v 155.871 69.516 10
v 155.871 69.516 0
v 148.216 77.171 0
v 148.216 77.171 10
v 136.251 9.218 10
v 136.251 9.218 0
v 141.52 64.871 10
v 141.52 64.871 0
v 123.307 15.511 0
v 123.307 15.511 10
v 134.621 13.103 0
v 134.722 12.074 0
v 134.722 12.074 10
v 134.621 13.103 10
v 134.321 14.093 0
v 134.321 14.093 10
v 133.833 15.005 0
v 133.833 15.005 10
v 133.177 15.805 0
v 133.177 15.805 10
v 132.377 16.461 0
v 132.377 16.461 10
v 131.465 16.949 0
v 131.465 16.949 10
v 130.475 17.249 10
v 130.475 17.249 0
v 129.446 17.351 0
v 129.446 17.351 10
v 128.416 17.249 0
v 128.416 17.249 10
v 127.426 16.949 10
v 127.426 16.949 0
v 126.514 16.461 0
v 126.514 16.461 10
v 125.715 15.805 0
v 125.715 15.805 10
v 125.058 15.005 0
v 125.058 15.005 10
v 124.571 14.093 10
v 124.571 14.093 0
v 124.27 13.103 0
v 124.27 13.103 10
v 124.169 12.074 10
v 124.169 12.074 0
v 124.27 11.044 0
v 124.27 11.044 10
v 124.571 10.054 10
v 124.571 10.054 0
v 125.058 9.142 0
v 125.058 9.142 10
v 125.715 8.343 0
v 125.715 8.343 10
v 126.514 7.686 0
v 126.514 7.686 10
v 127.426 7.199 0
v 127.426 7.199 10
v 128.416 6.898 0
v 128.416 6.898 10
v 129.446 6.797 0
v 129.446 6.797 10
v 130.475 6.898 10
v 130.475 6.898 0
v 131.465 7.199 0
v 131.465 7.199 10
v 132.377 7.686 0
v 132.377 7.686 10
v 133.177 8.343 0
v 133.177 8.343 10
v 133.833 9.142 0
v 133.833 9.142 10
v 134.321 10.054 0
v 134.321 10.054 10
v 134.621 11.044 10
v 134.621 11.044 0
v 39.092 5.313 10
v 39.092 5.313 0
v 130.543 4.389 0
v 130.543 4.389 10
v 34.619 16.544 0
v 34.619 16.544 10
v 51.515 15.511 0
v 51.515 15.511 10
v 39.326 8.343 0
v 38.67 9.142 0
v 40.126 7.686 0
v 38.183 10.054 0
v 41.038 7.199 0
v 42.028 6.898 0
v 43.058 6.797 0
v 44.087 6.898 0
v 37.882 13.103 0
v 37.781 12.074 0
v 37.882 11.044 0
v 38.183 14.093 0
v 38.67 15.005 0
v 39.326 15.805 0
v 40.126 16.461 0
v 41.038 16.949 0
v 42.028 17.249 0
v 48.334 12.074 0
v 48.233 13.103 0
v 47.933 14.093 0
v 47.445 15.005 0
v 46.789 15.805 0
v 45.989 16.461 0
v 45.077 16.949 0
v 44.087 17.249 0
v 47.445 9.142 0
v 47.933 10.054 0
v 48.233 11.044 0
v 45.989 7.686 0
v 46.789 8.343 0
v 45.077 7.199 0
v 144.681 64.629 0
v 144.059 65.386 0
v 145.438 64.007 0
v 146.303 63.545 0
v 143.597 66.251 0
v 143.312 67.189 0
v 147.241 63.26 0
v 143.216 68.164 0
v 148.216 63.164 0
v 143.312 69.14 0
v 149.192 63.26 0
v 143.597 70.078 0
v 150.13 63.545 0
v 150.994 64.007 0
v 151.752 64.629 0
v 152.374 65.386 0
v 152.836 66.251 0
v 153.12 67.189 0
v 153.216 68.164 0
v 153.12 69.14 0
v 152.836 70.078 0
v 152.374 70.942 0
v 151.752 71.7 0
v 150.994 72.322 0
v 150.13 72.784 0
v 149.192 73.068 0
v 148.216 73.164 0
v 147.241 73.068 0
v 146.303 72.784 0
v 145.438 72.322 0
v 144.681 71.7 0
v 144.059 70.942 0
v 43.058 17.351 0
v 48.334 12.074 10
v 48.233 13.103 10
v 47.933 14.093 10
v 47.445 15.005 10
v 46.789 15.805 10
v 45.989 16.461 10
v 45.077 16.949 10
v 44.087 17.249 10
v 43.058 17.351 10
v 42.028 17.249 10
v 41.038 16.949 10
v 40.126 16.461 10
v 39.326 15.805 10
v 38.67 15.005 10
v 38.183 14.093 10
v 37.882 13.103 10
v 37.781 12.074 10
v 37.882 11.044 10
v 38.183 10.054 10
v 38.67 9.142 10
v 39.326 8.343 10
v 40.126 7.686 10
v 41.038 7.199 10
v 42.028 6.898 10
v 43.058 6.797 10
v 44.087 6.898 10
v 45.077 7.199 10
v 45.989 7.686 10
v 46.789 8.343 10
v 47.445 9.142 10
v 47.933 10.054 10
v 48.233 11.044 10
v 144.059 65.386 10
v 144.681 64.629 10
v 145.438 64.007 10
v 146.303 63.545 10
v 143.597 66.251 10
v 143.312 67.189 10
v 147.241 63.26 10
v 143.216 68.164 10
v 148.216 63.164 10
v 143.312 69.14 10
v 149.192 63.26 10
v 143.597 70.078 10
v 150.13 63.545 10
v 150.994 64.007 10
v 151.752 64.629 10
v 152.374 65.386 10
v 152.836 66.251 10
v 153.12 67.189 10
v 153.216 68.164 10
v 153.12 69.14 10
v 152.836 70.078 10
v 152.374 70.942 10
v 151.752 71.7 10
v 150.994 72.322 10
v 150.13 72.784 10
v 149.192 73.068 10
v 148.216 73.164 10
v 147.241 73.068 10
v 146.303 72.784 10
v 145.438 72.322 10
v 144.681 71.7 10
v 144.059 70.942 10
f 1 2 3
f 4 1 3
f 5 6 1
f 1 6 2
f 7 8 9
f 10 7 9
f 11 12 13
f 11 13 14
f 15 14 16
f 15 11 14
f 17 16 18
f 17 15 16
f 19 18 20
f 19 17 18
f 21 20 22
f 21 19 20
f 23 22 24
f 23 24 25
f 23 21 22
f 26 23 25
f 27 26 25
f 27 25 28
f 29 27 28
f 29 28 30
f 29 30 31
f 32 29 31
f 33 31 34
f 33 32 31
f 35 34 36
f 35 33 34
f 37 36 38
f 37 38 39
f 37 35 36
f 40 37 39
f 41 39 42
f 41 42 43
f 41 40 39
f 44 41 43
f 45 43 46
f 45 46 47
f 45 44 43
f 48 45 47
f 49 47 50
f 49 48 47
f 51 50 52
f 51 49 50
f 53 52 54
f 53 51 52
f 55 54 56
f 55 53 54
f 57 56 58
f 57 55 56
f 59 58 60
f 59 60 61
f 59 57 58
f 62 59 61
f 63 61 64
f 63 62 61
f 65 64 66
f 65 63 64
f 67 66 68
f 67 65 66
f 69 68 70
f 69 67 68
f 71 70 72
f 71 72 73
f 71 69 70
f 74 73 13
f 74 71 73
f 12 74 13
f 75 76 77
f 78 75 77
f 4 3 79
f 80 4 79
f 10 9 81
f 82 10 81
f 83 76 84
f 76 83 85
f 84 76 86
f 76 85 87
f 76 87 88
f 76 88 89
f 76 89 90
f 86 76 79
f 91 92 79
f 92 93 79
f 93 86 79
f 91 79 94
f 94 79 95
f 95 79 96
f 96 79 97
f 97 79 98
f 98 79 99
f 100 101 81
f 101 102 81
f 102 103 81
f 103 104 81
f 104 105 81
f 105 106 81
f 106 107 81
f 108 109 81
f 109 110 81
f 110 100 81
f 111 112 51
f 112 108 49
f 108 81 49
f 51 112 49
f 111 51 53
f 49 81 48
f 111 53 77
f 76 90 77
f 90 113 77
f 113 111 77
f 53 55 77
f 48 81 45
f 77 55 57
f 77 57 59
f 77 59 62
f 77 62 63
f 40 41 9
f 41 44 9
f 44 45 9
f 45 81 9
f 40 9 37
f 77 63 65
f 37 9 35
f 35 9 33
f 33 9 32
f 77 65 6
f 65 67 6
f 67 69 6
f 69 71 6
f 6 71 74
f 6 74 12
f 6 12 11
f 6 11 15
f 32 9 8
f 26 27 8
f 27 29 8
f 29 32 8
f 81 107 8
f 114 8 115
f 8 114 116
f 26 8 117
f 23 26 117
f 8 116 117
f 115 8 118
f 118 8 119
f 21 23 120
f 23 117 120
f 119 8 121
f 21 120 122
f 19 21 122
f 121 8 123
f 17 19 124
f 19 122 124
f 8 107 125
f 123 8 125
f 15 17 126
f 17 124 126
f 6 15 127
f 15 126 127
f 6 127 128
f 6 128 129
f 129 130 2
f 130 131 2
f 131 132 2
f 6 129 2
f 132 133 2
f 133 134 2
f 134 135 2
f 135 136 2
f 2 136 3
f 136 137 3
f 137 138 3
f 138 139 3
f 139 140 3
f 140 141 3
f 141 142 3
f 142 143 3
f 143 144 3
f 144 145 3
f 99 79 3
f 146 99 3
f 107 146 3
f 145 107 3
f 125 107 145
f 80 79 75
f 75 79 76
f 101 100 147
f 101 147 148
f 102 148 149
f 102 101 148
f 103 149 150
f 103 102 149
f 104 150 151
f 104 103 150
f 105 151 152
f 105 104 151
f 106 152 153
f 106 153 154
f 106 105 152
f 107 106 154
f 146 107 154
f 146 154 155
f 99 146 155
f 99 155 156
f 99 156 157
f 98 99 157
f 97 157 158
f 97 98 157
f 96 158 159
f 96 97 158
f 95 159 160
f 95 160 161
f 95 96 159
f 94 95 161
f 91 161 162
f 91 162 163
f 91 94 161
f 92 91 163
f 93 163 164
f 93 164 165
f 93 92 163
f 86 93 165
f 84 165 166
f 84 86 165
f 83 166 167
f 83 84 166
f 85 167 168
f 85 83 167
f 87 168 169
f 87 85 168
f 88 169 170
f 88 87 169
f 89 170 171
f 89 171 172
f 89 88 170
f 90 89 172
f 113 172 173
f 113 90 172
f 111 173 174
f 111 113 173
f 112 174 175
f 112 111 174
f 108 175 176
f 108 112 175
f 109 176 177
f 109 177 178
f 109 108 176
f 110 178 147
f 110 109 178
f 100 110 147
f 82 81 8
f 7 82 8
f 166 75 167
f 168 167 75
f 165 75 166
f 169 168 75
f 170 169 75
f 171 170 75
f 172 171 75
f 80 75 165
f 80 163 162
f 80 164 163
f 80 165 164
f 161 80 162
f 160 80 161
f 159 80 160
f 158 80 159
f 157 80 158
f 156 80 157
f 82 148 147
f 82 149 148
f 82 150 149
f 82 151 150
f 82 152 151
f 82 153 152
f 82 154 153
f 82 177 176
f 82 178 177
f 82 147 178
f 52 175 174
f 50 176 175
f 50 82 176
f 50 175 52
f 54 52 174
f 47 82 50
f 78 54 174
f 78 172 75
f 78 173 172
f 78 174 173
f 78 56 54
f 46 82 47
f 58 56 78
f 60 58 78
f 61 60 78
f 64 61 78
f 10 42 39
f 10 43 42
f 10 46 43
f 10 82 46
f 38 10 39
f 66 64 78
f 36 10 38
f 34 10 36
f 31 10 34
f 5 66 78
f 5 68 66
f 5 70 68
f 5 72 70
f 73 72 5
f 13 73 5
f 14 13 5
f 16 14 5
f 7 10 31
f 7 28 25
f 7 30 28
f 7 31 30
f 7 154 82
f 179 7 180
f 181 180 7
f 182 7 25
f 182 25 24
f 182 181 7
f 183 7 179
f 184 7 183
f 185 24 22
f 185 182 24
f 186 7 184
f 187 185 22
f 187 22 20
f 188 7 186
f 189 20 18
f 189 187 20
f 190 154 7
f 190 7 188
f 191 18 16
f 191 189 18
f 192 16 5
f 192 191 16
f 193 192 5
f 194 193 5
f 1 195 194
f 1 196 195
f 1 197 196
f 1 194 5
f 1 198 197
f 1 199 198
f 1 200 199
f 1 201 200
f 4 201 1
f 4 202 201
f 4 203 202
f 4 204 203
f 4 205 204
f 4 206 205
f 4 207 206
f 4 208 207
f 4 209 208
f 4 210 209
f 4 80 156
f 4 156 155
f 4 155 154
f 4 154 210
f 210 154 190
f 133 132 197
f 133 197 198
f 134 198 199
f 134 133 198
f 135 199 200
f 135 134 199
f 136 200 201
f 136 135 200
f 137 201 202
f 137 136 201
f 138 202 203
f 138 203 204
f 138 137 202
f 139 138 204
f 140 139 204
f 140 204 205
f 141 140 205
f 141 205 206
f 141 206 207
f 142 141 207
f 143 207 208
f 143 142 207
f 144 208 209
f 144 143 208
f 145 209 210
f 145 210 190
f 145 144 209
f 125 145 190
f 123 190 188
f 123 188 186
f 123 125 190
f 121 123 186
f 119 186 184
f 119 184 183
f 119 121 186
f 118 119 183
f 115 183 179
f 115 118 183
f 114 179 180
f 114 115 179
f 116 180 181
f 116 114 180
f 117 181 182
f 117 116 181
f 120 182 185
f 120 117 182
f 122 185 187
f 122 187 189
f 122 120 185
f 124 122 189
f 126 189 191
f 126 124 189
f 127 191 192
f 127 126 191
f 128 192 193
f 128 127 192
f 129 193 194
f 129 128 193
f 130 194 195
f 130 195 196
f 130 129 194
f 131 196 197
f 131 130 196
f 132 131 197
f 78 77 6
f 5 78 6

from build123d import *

# Parameters (mm, degrees)
SKETCH_1_R      = 5.276731009
SKETCH_1_R_2    = 5
EXTRUDE_1_DEPTH = 10


with BuildPart() as part:
    # 草图1 → 凸台-拉伸1 (new body)
    with BuildSketch(Plane.XY):
        Polygon((39.091663842, 5.312766173), (130.54342243, 4.388552153), (136.25140436, 9.218383017), (155.871075353, 69.515715172), (148.216212638, 77.170577887), (34.619185934, 16.543655141), align=None)
        with Locations((43.057622456, 12.073793968)):
            Circle(SKETCH_1_R, mode=Mode.SUBTRACT)
        with Locations((129.445733597, 12.073793968)):
            Circle(SKETCH_1_R, mode=Mode.SUBTRACT)
        with Locations((148.216212638, 68.164273338)):
            Circle(SKETCH_1_R_2, mode=Mode.SUBTRACT)
        Polygon((51.515213585, 15.511098763), (141.520310758, 64.87120684), (123.306992034, 15.511098763), align=None, mode=Mode.SUBTRACT)
    extrude(amount=EXTRUDE_1_DEPTH)


solid = part.part
